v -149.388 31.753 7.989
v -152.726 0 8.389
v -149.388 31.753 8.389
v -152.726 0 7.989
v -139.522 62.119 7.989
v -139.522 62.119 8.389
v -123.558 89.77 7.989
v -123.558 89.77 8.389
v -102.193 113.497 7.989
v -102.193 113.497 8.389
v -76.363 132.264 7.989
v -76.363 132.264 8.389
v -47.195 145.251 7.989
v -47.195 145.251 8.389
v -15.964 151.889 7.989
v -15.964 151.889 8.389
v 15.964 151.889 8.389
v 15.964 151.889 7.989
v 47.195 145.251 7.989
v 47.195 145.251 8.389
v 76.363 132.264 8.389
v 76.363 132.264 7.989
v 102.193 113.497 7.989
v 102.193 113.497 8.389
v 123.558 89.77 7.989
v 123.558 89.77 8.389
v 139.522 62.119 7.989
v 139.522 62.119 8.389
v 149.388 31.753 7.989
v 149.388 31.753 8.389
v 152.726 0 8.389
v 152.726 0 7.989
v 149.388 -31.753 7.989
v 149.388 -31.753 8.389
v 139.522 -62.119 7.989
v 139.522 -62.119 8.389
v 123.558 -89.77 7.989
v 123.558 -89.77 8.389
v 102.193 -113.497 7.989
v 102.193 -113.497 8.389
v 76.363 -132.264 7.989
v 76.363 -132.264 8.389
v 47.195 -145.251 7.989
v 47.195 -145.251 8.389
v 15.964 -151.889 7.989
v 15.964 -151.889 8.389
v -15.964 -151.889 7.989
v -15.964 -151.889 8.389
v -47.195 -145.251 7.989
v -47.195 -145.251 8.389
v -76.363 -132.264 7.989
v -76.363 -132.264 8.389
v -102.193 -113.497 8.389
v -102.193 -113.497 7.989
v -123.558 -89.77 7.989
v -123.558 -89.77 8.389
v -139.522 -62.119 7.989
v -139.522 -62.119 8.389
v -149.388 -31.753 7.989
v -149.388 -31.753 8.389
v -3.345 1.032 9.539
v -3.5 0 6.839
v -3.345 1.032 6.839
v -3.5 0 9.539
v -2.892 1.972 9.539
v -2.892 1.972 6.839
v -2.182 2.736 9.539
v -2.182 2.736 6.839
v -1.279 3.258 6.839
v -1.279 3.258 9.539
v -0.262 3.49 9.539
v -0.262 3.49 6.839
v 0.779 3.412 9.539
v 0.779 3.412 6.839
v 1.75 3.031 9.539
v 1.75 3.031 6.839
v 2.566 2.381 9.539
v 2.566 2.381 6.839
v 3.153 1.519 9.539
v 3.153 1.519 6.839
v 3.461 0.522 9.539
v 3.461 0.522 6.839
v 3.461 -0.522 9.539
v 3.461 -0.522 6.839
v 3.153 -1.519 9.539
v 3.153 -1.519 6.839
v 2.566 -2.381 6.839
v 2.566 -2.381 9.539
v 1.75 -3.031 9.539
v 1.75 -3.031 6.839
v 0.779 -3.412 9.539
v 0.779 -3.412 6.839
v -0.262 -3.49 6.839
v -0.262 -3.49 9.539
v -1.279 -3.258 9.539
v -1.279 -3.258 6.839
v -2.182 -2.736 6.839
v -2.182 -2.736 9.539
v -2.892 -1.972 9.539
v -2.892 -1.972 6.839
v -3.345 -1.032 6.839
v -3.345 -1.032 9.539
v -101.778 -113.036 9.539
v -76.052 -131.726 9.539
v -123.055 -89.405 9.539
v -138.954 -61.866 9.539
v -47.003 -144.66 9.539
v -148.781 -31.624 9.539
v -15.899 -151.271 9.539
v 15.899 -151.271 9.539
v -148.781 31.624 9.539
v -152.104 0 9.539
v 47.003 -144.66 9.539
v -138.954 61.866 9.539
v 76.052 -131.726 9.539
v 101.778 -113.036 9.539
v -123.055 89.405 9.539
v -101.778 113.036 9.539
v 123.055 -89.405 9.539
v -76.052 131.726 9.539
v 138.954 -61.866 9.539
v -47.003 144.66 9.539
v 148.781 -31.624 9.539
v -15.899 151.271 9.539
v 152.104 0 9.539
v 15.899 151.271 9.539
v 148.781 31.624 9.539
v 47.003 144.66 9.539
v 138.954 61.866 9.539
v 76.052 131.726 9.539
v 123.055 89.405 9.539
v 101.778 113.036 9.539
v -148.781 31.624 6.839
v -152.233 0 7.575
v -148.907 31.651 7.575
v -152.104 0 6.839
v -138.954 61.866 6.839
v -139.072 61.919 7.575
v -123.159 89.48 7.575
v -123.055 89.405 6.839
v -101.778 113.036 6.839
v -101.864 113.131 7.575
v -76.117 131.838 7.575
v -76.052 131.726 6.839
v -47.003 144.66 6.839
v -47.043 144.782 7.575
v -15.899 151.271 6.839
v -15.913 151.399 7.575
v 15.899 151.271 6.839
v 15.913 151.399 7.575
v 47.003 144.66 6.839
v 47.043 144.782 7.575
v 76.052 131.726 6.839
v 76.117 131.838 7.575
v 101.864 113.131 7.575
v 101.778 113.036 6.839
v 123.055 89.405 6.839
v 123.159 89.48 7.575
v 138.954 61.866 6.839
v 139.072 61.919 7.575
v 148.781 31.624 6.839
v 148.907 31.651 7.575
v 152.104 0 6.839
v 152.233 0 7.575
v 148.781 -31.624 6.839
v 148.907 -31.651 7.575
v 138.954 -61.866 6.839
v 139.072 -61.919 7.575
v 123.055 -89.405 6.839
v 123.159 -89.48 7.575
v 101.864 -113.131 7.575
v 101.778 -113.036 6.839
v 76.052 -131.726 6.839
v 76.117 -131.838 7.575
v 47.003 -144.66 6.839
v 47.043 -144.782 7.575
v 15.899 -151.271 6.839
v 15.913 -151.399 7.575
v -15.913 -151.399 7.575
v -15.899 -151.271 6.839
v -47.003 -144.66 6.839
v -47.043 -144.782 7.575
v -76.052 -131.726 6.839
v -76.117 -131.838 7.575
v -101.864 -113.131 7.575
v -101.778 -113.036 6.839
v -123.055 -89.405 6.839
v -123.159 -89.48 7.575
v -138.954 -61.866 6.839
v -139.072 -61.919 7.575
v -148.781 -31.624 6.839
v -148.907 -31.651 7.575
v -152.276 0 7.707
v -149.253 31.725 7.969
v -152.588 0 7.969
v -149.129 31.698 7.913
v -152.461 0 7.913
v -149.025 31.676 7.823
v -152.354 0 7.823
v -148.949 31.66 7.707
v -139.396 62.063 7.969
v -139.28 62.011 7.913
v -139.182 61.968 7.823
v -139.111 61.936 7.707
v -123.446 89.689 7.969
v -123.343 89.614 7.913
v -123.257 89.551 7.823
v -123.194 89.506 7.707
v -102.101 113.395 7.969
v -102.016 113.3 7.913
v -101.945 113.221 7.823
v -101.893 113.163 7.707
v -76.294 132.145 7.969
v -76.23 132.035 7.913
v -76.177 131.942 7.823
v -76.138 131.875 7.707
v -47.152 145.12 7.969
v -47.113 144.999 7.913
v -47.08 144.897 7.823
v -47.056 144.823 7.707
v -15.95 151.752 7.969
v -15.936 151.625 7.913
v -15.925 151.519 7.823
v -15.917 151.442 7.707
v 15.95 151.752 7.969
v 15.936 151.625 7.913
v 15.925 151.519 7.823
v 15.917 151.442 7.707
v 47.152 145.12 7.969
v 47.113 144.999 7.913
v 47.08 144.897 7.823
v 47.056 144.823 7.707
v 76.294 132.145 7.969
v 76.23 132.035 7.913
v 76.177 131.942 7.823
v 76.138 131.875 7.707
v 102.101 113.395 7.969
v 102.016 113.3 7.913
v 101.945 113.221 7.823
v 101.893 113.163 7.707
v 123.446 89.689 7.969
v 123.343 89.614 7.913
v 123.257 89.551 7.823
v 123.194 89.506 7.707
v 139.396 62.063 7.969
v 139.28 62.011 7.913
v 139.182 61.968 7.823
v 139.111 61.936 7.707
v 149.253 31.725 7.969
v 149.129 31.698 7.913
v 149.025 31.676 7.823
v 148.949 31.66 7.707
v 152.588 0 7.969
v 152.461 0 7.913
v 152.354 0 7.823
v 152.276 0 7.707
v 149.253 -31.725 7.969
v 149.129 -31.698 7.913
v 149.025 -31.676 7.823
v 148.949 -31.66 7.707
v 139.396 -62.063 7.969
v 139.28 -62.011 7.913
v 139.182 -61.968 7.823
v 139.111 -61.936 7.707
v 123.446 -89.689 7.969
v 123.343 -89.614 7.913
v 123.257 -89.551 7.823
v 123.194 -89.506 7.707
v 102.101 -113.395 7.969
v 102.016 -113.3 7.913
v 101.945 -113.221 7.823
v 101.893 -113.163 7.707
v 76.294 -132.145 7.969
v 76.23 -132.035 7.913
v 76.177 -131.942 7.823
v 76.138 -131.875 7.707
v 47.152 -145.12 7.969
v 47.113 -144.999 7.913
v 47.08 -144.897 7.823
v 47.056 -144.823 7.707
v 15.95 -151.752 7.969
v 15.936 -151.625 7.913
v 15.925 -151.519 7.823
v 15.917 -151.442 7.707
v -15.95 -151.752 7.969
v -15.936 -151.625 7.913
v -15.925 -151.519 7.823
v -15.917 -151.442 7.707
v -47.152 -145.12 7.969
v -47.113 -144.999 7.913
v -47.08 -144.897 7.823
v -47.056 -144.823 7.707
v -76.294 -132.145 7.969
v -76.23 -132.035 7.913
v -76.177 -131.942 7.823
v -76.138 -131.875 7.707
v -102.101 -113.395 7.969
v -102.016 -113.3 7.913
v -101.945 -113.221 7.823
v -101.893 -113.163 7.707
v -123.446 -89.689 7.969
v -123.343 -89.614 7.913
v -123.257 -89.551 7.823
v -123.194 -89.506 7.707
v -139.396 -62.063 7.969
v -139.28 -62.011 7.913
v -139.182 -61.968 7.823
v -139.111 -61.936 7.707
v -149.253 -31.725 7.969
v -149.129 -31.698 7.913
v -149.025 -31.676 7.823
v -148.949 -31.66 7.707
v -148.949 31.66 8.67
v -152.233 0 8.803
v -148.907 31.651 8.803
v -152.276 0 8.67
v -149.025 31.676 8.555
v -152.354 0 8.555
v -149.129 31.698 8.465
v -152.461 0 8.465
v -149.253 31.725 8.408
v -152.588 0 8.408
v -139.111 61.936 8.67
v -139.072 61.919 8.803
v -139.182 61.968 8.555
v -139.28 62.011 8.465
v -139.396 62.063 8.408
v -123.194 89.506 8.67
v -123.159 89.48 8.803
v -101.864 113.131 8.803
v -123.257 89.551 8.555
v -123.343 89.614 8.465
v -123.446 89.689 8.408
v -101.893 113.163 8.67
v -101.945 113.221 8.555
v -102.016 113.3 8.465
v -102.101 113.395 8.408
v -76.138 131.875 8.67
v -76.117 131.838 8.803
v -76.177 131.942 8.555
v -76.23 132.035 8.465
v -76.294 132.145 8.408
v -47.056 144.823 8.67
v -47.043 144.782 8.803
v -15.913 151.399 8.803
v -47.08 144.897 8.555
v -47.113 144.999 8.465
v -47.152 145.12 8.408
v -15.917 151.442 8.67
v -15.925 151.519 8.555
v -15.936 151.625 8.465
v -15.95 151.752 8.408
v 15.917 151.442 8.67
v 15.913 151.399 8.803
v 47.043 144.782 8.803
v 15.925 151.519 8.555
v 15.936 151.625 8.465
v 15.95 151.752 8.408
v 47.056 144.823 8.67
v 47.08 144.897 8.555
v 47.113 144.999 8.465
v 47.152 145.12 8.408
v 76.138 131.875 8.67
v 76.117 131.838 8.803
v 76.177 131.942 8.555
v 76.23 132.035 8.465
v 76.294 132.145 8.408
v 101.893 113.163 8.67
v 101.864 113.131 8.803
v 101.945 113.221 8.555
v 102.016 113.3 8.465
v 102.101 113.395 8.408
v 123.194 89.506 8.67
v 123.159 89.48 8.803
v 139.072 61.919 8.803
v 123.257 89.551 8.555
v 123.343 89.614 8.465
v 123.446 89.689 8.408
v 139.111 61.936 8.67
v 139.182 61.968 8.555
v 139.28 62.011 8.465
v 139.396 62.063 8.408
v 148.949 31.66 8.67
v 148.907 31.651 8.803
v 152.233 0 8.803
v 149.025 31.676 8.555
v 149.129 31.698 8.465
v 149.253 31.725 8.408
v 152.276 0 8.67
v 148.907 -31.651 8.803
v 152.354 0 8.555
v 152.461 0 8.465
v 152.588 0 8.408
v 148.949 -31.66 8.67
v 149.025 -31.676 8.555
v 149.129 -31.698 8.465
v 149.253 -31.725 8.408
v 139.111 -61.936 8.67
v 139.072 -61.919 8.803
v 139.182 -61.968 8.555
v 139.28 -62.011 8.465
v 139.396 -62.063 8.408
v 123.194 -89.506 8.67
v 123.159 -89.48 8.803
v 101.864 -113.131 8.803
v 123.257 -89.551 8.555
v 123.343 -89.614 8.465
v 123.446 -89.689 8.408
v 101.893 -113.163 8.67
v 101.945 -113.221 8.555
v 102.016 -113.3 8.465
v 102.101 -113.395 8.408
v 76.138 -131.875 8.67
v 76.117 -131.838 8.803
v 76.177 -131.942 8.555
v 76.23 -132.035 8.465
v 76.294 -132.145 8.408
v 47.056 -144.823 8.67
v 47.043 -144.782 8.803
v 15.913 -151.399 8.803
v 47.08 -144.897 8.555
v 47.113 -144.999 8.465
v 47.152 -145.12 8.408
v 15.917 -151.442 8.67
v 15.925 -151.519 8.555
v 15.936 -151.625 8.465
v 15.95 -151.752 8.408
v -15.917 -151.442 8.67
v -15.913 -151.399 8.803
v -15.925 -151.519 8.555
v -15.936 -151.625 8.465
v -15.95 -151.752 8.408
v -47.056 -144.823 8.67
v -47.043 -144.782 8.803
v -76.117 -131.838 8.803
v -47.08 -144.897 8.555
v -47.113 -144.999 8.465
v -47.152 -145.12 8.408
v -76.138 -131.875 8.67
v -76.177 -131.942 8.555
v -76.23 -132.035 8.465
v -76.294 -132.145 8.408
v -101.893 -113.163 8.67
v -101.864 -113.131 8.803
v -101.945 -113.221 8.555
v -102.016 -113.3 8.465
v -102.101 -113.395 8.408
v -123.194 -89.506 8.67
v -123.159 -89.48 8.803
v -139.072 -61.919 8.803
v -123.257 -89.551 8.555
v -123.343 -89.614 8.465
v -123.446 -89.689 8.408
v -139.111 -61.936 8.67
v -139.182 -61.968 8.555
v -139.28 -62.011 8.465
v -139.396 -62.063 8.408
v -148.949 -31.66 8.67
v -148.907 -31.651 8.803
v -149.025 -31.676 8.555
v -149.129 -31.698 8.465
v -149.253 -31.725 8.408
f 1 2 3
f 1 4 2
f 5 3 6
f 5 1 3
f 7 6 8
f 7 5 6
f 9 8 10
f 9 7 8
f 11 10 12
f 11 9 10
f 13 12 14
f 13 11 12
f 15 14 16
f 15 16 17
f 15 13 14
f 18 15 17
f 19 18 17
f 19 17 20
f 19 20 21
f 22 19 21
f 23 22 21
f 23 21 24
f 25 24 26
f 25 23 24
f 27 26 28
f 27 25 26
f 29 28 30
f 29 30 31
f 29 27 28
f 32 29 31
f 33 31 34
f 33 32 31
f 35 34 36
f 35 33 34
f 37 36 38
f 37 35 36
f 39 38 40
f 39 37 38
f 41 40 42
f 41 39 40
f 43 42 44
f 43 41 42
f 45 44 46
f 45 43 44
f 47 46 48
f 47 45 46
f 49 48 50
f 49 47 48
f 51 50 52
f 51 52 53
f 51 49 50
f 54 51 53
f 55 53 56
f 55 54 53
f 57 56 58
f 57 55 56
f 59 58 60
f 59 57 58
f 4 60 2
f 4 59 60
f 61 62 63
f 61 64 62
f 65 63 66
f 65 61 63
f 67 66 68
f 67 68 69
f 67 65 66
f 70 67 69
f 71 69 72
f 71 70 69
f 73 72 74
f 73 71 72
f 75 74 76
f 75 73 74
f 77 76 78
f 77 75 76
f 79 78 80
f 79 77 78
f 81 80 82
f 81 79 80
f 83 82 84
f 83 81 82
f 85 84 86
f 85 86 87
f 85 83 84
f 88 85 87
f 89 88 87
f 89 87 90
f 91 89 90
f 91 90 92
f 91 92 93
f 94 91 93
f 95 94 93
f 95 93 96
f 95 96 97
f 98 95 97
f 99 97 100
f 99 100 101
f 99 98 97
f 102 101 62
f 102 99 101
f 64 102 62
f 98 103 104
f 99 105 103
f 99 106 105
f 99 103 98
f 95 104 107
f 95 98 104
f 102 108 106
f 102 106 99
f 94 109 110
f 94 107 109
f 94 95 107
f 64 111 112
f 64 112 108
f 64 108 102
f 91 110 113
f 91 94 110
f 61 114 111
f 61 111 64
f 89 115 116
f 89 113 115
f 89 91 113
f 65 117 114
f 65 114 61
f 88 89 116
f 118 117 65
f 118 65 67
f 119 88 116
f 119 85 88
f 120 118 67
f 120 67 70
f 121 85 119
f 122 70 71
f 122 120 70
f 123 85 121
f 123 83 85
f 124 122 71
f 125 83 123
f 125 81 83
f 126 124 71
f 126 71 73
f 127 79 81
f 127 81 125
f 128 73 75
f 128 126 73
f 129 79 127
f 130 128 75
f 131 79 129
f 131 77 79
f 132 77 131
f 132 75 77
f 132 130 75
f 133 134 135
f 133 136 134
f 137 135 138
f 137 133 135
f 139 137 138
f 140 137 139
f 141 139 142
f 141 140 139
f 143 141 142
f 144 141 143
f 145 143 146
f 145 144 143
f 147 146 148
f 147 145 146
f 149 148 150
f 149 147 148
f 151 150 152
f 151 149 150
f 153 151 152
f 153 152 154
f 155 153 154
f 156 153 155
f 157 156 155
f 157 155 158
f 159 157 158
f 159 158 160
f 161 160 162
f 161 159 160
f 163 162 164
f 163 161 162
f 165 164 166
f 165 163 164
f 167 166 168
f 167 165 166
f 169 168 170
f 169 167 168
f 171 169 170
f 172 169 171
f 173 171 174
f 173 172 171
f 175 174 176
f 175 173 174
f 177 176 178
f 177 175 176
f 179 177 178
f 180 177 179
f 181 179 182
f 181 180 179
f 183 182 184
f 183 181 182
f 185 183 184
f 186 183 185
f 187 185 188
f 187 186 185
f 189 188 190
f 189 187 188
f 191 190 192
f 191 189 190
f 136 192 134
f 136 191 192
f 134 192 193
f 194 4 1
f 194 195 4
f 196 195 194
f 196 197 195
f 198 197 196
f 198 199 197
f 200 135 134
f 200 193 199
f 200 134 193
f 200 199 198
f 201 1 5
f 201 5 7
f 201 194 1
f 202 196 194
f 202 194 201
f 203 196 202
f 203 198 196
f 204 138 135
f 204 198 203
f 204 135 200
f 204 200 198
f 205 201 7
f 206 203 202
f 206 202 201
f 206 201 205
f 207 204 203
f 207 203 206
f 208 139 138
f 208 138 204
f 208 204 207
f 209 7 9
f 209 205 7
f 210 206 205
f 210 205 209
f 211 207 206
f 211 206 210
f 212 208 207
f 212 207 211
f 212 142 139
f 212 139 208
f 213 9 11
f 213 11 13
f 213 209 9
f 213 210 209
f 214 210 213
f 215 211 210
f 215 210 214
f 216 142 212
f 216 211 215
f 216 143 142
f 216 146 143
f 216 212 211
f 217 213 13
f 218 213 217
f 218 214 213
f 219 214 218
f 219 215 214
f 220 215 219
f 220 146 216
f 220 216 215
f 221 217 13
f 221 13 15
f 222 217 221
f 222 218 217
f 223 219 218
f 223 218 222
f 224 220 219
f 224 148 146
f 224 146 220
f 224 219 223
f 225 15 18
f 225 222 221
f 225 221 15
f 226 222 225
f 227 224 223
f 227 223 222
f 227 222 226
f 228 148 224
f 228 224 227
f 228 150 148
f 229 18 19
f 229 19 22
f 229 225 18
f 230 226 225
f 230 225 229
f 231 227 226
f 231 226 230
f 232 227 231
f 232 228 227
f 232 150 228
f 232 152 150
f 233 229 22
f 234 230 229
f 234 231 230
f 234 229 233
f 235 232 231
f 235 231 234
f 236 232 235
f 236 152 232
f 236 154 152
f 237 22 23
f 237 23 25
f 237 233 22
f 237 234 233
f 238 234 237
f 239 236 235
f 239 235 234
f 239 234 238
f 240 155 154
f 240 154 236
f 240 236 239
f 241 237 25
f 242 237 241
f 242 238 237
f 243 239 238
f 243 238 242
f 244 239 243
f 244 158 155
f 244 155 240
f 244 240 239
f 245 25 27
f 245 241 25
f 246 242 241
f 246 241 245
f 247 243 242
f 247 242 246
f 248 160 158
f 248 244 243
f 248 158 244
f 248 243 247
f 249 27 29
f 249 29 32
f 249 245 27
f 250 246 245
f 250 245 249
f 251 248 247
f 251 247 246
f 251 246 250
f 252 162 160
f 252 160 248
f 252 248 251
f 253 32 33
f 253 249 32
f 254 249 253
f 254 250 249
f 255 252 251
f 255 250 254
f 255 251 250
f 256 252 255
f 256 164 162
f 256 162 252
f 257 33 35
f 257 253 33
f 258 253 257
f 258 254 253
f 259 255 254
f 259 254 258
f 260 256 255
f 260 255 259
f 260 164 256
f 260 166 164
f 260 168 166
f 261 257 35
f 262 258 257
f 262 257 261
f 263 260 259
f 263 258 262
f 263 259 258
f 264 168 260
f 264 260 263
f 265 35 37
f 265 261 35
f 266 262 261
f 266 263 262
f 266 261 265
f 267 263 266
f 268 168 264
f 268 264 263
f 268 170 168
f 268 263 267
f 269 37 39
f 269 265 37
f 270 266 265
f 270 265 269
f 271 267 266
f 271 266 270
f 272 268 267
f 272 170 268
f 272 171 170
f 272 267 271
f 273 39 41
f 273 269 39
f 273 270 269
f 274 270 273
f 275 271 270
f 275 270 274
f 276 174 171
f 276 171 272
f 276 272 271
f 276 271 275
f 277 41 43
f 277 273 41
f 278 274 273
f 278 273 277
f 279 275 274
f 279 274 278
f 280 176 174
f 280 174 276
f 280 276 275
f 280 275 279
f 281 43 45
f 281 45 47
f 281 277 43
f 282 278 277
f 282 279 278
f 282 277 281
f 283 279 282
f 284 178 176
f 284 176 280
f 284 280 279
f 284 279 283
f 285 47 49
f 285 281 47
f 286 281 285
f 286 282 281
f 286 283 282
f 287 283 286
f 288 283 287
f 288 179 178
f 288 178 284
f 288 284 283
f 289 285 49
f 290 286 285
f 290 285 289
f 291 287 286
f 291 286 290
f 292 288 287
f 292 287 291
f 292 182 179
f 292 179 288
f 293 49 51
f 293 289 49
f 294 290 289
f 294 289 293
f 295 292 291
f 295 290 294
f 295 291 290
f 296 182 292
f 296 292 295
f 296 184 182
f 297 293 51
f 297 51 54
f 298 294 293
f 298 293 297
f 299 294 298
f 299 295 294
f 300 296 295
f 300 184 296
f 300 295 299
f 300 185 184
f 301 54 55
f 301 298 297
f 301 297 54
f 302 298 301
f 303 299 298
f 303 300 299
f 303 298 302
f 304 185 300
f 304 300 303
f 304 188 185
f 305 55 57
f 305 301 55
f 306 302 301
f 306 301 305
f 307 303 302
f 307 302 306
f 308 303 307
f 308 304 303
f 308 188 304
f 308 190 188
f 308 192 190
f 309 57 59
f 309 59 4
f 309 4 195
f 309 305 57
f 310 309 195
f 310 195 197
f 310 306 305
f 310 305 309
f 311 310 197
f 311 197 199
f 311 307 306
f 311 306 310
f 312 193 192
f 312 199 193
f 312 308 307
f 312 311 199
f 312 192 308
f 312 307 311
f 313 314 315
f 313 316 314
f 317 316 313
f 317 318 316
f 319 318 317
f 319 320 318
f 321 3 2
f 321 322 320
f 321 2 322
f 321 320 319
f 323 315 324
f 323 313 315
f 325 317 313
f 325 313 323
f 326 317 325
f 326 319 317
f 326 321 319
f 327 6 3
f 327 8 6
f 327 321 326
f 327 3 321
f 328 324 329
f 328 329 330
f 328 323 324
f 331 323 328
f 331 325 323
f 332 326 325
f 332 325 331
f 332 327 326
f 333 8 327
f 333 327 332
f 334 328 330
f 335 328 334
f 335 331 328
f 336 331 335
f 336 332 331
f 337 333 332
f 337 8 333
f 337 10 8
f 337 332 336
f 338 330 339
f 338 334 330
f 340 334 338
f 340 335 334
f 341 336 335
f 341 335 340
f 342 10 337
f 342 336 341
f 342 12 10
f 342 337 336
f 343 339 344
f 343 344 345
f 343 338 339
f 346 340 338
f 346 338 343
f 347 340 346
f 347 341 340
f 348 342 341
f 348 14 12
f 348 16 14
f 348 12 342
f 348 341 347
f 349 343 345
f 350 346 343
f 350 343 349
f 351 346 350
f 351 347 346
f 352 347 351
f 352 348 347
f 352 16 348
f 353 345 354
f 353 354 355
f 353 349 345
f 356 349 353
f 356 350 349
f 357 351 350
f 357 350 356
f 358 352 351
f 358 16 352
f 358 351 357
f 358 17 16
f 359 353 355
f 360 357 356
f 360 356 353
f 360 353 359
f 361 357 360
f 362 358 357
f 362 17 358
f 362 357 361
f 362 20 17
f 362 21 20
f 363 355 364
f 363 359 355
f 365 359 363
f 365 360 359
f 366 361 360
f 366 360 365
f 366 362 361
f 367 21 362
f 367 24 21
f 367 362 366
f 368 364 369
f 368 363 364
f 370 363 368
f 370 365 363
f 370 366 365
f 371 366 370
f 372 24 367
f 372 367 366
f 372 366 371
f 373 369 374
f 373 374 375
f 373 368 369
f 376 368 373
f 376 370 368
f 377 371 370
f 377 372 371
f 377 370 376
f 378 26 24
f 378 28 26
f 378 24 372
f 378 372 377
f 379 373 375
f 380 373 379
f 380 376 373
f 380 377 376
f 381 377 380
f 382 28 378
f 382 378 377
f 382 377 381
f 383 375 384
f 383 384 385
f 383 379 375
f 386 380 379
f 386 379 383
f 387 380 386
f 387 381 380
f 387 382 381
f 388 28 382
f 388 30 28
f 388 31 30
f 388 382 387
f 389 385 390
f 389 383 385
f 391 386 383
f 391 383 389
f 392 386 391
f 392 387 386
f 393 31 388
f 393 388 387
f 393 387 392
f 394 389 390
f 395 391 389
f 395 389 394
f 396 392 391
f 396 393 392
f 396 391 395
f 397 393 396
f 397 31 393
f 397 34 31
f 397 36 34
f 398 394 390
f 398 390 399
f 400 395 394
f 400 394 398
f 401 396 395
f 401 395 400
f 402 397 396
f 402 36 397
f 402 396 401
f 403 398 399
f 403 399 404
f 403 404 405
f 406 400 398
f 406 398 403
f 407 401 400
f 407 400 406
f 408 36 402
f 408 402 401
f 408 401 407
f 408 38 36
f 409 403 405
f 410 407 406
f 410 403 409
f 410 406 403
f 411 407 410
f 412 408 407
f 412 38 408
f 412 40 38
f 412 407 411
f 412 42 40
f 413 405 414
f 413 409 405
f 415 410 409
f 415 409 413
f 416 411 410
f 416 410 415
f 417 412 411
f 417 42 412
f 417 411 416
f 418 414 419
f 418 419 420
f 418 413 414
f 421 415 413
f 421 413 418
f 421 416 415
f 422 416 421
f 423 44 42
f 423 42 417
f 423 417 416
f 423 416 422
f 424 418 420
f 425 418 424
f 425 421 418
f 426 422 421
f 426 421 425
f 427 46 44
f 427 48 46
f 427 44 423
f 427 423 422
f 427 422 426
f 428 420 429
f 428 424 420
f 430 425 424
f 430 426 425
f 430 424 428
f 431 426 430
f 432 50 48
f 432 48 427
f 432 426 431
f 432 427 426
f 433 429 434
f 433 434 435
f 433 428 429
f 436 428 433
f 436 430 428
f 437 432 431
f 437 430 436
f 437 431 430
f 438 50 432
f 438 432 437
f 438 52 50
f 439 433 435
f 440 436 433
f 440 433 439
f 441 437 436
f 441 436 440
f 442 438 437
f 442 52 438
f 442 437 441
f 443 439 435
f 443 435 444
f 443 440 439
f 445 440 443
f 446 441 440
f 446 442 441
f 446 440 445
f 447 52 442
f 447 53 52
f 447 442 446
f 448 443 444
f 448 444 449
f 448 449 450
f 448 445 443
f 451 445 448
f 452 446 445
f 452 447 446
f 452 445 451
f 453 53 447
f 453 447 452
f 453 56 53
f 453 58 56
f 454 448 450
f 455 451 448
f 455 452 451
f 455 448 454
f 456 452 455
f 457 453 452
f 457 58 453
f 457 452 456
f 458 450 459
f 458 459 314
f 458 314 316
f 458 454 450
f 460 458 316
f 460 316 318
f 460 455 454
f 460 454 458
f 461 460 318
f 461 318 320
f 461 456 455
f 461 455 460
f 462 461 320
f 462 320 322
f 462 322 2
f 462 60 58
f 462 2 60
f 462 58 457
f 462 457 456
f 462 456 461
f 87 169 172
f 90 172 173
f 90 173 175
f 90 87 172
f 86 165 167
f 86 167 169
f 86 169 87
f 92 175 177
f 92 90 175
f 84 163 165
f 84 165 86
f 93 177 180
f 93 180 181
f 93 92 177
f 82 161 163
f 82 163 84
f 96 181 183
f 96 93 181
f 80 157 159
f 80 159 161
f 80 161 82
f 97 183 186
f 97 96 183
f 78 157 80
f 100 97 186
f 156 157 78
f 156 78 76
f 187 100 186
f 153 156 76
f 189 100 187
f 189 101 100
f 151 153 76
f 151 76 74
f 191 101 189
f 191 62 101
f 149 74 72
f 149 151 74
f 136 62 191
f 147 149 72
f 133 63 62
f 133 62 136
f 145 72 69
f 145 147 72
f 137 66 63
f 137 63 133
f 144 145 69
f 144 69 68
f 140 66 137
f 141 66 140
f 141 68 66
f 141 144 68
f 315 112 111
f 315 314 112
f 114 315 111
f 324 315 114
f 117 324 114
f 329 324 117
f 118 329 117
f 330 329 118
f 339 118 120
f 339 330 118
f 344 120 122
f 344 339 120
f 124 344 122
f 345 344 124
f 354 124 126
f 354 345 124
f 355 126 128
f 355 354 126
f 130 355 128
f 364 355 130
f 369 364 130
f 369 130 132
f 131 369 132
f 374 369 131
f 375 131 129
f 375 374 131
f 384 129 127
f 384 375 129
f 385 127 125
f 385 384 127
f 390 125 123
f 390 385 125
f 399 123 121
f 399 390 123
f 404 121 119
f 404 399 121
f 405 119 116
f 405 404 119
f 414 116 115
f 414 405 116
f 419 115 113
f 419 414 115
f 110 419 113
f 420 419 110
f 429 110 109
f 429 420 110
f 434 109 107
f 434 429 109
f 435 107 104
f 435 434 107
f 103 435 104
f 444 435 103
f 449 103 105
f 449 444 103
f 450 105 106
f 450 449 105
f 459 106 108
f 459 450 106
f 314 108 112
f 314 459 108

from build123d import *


with BuildPart() as f1:
    # F0 (on Front) → F1 (revolve)
    with BuildSketch(Plane.XZ):
        with BuildLine():
            Line((-20.309017, 6.838791), (-20.181025, 6.838791))
            Line((-20.181025, 6.838791), (-3.5, 6.838791))
            Line((-3.5, 6.838791), (-3.5, 9.538791))
            Line((-3.5, 9.538791), (-20.181025, 9.538791))
            Line((-20.181025, 9.538791), (-20.309017, 9.538791))
            Line((-20.309017, 9.538791), (-152.104487, 9.538791))
            Line((-152.104487, 9.538791), (-152.233252, 8.802641))
            ThreePointArc((-152.233252, 8.802641), (-152.404118, 8.505989), (-152.725774, 8.388791))
            Line((-152.725774, 8.388791), (-152.725774, 7.988791))
            ThreePointArc((-152.725774, 7.988791), (-152.404118, 7.871594), (-152.233252, 7.574942))
            Line((-152.233252, 7.574942), (-152.104487, 6.838791))
            Line((-152.104487, 6.838791), (-20.309017, 6.838791))
        make_face()
    revolve(axis=Axis((0, 0, -43.787105), (0, 0, -1)))


solid = f1.part
